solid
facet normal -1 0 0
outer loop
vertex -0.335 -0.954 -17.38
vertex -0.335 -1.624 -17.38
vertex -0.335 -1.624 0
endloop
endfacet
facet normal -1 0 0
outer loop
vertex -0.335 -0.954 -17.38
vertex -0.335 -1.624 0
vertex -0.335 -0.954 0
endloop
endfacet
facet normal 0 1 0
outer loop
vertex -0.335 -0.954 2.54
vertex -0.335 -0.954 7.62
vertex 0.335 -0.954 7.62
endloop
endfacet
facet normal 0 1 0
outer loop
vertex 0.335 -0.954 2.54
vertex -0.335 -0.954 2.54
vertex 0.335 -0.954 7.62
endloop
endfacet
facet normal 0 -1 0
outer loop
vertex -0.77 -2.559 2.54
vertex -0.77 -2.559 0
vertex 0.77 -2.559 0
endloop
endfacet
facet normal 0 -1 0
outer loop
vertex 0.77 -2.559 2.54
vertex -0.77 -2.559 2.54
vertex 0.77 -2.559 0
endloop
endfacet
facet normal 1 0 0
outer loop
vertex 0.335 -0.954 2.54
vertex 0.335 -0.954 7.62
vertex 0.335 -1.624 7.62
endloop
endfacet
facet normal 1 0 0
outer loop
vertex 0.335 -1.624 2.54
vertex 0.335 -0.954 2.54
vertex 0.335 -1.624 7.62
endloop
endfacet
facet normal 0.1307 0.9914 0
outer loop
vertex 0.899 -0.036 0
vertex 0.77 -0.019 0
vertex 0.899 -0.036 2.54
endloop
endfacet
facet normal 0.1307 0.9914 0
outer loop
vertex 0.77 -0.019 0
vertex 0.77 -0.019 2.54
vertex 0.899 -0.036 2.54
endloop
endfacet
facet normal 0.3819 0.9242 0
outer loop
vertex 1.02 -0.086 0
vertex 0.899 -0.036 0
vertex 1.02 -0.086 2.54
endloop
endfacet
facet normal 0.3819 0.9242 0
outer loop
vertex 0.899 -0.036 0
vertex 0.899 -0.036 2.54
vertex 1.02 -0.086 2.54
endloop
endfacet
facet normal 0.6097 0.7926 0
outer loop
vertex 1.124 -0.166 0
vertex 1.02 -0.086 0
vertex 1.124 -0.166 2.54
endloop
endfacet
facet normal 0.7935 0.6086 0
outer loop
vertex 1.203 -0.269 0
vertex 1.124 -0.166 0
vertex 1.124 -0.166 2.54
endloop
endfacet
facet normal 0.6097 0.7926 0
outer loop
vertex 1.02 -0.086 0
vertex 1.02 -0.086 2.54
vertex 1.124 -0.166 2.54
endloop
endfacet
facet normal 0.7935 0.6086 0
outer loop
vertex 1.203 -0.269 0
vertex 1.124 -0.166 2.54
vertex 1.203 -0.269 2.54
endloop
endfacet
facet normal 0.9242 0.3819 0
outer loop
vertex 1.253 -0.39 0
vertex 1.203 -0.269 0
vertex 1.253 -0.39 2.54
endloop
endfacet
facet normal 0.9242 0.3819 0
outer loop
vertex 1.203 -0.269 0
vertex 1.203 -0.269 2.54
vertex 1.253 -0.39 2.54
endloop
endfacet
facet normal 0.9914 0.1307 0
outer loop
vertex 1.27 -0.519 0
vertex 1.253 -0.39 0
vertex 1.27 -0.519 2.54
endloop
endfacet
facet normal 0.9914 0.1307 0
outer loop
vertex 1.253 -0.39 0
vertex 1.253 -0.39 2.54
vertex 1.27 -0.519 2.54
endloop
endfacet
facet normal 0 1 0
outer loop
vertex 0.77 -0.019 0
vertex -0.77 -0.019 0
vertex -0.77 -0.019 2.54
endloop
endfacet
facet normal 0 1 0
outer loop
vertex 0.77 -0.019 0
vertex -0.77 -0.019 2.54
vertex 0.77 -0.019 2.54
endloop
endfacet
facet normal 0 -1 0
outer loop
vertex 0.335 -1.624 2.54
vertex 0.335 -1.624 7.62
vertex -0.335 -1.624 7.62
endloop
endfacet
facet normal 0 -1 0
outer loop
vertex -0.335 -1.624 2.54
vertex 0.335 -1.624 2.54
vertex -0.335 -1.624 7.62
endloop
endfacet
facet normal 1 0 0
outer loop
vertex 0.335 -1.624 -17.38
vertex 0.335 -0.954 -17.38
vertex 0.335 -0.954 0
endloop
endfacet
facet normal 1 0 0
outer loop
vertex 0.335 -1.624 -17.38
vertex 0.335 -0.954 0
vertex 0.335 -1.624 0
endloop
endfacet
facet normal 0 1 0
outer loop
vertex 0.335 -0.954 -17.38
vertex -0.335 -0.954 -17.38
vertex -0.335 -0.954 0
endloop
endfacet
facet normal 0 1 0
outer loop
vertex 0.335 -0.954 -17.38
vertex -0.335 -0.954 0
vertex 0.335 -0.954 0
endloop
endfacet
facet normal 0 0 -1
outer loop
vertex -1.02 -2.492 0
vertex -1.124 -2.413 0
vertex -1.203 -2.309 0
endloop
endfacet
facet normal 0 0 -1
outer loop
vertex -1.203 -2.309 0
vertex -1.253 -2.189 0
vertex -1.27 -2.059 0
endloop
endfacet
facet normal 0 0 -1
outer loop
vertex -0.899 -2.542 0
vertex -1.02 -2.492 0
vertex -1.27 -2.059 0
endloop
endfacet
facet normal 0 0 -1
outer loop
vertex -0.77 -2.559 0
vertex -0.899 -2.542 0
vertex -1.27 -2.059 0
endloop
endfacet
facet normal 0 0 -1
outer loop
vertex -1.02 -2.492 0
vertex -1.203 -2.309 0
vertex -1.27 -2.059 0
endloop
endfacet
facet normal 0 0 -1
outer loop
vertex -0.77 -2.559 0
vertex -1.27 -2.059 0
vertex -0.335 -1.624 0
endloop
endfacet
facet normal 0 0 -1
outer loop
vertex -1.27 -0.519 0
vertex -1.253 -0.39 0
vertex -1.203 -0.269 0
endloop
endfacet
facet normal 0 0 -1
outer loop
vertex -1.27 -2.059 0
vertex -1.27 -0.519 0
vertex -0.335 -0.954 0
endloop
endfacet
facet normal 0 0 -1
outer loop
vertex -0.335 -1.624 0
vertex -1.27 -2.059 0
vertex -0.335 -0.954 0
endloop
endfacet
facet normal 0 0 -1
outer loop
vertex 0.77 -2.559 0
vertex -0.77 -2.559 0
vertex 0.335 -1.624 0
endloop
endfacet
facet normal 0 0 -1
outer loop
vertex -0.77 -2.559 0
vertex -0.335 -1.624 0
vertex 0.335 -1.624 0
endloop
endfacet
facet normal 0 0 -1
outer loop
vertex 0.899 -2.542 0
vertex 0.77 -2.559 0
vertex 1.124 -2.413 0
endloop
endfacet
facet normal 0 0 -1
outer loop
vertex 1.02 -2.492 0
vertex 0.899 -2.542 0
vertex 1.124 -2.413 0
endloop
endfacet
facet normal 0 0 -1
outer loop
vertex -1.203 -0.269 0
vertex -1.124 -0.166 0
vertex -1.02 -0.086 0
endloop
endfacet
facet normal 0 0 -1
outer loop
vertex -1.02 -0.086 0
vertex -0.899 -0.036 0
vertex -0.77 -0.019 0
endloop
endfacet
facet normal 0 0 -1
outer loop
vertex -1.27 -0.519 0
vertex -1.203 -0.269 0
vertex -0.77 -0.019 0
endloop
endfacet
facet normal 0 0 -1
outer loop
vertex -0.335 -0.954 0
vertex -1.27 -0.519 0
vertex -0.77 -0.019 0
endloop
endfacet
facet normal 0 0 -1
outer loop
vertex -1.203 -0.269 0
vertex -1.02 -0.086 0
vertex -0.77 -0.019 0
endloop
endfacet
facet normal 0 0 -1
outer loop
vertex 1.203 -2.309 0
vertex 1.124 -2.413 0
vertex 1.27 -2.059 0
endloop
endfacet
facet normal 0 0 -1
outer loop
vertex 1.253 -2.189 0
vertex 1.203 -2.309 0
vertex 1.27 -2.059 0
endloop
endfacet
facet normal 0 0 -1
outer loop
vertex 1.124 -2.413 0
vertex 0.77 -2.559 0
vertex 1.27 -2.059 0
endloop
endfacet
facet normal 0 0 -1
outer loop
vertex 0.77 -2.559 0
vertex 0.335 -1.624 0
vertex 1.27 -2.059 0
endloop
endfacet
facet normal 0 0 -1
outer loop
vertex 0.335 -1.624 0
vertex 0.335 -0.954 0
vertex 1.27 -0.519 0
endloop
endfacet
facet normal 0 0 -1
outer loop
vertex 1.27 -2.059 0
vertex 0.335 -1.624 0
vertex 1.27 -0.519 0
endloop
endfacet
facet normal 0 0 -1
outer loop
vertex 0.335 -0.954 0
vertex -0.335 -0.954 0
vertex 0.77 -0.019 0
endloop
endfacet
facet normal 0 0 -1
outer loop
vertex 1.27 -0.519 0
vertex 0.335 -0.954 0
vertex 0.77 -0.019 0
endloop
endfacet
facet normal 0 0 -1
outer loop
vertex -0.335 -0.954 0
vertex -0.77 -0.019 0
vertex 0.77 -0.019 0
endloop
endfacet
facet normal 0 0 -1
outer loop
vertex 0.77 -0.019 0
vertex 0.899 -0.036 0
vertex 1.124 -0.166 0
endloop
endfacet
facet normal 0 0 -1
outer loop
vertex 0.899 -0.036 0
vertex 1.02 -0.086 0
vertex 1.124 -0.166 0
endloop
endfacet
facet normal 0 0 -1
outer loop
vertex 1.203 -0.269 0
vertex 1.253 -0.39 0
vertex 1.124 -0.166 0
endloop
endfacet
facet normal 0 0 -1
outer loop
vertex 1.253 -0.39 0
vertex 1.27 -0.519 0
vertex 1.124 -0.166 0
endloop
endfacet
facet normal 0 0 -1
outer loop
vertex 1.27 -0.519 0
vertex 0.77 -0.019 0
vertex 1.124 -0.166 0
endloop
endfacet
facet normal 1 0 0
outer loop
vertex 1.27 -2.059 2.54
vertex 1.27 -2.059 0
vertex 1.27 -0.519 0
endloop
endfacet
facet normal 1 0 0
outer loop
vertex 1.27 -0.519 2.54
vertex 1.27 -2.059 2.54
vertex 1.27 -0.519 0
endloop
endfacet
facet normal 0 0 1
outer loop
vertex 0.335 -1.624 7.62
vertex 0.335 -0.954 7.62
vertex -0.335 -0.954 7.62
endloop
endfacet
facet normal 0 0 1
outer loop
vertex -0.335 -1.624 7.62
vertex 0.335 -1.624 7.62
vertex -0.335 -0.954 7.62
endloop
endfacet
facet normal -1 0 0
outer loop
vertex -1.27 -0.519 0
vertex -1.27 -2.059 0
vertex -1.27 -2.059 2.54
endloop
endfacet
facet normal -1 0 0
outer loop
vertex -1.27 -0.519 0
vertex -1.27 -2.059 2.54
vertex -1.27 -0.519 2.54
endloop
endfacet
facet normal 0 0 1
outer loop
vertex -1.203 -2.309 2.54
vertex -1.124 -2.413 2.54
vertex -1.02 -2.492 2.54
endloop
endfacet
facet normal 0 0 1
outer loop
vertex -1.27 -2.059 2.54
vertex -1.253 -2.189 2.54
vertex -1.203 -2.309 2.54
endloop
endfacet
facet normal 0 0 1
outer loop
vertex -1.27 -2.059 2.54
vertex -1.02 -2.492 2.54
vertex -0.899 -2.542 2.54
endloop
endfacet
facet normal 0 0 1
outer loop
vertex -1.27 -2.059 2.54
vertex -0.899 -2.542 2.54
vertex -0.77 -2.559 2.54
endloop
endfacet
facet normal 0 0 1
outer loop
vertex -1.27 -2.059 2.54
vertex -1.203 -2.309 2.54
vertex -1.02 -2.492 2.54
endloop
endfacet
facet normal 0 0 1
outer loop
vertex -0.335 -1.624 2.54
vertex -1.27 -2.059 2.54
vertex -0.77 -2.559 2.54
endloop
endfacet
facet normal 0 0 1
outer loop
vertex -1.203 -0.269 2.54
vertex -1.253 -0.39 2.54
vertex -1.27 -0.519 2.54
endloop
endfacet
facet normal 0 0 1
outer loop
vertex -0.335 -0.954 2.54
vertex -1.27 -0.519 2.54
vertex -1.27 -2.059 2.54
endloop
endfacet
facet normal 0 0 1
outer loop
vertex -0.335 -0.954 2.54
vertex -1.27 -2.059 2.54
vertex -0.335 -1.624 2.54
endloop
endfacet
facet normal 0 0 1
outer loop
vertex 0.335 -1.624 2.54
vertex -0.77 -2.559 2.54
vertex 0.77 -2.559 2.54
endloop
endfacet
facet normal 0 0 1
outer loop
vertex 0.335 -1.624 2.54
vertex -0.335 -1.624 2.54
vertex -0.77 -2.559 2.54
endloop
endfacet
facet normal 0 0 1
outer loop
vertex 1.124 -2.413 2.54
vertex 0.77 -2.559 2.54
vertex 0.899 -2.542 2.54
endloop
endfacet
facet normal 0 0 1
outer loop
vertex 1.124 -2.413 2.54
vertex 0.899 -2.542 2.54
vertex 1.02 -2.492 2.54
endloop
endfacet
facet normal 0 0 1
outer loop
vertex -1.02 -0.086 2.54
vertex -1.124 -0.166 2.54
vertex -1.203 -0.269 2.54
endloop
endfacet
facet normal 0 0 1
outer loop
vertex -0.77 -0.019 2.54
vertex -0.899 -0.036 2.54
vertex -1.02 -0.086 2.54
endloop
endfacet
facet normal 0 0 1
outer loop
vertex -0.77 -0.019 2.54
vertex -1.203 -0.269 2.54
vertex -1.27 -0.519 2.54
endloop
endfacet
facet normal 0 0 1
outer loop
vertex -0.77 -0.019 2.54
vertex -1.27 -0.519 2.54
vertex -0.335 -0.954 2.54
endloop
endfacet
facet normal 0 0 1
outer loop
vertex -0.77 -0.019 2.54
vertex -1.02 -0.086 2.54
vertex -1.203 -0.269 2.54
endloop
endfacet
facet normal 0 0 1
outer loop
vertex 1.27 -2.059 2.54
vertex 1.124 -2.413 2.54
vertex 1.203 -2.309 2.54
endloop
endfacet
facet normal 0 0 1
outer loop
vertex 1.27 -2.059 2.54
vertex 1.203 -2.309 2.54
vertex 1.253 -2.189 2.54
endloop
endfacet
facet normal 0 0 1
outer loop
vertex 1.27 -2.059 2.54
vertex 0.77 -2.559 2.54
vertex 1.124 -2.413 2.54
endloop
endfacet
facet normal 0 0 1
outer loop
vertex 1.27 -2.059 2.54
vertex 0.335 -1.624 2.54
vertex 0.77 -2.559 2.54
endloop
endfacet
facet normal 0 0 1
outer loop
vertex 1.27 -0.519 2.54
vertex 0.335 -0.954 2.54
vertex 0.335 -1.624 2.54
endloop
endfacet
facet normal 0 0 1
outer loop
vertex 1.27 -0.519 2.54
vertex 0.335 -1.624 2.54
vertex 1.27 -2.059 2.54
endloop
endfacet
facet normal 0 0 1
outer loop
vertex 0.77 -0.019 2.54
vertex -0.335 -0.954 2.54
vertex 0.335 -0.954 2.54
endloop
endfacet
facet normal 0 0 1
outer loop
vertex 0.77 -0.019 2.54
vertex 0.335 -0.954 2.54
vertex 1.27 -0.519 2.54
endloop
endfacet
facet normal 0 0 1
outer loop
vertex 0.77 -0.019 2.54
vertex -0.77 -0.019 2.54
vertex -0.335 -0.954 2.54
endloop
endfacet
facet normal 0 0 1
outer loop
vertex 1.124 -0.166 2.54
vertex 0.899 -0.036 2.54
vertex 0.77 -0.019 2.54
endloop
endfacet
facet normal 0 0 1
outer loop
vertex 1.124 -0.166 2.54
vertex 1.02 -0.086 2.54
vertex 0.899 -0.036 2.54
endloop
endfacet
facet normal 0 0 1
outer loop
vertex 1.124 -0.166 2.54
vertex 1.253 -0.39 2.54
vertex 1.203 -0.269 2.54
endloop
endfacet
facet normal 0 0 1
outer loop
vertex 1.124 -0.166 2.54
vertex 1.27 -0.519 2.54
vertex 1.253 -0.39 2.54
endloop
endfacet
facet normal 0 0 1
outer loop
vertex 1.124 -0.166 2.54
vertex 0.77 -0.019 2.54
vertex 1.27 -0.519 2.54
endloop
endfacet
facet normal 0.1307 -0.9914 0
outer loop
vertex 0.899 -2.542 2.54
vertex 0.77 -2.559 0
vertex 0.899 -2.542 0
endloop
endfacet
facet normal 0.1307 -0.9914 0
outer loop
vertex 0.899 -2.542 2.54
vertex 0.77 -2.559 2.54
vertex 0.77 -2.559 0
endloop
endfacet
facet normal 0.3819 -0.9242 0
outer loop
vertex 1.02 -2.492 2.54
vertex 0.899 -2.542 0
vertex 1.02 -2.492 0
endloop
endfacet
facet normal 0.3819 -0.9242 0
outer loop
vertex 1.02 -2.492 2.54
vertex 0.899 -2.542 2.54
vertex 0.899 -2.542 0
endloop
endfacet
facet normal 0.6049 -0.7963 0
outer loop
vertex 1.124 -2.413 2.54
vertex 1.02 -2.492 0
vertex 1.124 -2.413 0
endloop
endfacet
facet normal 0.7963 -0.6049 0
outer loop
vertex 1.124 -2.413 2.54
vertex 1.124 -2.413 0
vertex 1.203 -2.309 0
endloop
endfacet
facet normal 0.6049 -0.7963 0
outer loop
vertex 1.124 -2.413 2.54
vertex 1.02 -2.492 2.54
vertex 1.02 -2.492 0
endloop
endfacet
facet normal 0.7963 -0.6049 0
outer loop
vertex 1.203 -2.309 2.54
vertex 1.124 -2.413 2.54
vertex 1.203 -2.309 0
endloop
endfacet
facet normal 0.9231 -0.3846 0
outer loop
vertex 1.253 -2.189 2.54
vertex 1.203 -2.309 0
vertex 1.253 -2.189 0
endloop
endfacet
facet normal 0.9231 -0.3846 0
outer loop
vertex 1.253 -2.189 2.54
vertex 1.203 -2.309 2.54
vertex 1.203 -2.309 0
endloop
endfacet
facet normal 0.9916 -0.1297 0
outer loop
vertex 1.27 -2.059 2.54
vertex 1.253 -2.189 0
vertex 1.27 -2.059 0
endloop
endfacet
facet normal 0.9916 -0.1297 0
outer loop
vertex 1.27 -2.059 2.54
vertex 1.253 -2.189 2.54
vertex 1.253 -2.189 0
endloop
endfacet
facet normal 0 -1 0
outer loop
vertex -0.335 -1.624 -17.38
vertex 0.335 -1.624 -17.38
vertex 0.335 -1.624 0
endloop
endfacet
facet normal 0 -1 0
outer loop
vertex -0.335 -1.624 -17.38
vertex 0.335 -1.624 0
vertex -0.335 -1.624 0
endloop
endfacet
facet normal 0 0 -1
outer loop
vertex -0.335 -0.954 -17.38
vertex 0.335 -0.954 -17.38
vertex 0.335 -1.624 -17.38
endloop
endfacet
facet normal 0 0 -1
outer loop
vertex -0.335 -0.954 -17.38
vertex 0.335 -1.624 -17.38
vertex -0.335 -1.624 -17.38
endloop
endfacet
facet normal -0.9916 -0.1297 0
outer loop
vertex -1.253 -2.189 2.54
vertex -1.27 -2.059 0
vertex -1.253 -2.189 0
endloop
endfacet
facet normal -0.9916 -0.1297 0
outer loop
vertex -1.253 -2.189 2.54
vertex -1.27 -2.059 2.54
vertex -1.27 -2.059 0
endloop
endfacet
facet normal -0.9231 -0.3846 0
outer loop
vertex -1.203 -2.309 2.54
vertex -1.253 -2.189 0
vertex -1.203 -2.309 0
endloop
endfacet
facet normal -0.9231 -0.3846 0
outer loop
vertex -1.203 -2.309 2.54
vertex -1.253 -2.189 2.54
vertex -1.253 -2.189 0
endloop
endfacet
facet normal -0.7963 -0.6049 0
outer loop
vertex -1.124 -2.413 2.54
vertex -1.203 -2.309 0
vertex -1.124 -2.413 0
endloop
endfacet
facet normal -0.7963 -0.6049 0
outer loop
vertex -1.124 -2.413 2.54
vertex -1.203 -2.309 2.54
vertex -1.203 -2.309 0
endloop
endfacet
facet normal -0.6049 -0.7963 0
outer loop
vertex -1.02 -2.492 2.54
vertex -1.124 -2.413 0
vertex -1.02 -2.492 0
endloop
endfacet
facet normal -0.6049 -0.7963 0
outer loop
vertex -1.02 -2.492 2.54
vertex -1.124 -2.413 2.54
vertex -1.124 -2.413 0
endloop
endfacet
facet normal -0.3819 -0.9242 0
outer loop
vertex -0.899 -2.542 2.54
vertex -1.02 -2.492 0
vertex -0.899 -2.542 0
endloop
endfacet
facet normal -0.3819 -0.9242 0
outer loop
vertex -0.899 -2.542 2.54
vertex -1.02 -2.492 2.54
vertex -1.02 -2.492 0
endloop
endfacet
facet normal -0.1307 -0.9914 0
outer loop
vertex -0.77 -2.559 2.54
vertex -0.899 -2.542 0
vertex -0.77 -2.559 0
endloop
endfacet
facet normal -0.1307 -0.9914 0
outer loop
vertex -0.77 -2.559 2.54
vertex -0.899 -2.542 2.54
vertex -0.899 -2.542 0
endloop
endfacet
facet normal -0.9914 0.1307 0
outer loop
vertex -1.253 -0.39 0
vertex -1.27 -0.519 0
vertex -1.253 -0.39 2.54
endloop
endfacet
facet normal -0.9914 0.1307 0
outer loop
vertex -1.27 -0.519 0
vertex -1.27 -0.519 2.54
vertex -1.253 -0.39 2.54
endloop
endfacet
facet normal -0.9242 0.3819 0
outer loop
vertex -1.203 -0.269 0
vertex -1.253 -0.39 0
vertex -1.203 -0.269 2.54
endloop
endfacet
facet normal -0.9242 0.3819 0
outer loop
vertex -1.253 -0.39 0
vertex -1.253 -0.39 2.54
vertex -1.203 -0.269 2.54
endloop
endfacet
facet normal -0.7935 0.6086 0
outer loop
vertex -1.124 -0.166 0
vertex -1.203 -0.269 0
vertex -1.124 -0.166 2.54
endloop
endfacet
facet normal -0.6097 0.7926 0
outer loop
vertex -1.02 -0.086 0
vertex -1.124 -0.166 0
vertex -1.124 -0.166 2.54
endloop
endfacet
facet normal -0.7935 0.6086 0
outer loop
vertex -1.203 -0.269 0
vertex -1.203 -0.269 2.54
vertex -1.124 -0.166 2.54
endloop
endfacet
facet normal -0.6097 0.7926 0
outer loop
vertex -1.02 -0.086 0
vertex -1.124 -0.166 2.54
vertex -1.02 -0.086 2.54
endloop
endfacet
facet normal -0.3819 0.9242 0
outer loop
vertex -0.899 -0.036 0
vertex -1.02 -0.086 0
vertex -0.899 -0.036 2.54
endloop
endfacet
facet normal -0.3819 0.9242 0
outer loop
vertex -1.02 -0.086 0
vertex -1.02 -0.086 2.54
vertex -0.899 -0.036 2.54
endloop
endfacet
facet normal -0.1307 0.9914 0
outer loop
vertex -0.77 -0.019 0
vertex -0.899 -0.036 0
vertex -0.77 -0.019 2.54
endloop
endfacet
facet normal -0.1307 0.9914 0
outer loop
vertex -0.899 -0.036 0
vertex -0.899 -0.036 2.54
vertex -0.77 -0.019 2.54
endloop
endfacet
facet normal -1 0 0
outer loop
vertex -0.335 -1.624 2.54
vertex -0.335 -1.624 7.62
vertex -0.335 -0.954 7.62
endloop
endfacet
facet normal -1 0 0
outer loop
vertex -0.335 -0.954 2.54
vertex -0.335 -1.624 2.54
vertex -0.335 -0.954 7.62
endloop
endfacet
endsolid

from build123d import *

# Parameters (mm, degrees)
SKETCH_1_W      = 2.54
SKETCH_1_H      = 2.54
EXTRUDE_1_DEPTH = 2.54
SKETCH_2_W      = 0.67
SKETCH_2_H      = 0.67
FILLET_1_R      = 0.5


with BuildPart() as part:
    # 草图1 → 拉伸1 (new body)
    with BuildSketch(Plane.XY):
        with Locations((0, -1.289090726)):
            Rectangle(SKETCH_1_W, SKETCH_1_H)
    extrude(amount=EXTRUDE_1_DEPTH)

    # 扫描1: sweep along a path in 草图3
    with BuildLine(Plane(origin=(0, 0, 0), x_dir=(0, 0, -1), z_dir=(1, 0, 0))) as sweep_1_path:
        Line((17.38, -1.299090726), (-7.62, -1.299090726))
    # 草图2 → 扫描1 (sweep)
    with BuildSketch(Plane(origin=(0, 0, 7.62), x_dir=(-1, 0, 0), z_dir=(0, 0, -1))):
        with Locations((0, -1.289090726)):
            Rectangle(SKETCH_2_W, SKETCH_2_H)
    sweep(path=sweep_1_path.line)

    # 圆角1
    fillet_1_edges = [part.edges().sort_by_distance(p)[0] for p in [
        (-1.27, -0.019090726, 1.27),
        (1.27, -0.019090726, 1.27),
        (1.27, -2.559090726, 1.27),
        (-1.27, -2.559090726, 1.27),
    ]]
    fillet(fillet_1_edges, radius=FILLET_1_R)


solid = part.part
